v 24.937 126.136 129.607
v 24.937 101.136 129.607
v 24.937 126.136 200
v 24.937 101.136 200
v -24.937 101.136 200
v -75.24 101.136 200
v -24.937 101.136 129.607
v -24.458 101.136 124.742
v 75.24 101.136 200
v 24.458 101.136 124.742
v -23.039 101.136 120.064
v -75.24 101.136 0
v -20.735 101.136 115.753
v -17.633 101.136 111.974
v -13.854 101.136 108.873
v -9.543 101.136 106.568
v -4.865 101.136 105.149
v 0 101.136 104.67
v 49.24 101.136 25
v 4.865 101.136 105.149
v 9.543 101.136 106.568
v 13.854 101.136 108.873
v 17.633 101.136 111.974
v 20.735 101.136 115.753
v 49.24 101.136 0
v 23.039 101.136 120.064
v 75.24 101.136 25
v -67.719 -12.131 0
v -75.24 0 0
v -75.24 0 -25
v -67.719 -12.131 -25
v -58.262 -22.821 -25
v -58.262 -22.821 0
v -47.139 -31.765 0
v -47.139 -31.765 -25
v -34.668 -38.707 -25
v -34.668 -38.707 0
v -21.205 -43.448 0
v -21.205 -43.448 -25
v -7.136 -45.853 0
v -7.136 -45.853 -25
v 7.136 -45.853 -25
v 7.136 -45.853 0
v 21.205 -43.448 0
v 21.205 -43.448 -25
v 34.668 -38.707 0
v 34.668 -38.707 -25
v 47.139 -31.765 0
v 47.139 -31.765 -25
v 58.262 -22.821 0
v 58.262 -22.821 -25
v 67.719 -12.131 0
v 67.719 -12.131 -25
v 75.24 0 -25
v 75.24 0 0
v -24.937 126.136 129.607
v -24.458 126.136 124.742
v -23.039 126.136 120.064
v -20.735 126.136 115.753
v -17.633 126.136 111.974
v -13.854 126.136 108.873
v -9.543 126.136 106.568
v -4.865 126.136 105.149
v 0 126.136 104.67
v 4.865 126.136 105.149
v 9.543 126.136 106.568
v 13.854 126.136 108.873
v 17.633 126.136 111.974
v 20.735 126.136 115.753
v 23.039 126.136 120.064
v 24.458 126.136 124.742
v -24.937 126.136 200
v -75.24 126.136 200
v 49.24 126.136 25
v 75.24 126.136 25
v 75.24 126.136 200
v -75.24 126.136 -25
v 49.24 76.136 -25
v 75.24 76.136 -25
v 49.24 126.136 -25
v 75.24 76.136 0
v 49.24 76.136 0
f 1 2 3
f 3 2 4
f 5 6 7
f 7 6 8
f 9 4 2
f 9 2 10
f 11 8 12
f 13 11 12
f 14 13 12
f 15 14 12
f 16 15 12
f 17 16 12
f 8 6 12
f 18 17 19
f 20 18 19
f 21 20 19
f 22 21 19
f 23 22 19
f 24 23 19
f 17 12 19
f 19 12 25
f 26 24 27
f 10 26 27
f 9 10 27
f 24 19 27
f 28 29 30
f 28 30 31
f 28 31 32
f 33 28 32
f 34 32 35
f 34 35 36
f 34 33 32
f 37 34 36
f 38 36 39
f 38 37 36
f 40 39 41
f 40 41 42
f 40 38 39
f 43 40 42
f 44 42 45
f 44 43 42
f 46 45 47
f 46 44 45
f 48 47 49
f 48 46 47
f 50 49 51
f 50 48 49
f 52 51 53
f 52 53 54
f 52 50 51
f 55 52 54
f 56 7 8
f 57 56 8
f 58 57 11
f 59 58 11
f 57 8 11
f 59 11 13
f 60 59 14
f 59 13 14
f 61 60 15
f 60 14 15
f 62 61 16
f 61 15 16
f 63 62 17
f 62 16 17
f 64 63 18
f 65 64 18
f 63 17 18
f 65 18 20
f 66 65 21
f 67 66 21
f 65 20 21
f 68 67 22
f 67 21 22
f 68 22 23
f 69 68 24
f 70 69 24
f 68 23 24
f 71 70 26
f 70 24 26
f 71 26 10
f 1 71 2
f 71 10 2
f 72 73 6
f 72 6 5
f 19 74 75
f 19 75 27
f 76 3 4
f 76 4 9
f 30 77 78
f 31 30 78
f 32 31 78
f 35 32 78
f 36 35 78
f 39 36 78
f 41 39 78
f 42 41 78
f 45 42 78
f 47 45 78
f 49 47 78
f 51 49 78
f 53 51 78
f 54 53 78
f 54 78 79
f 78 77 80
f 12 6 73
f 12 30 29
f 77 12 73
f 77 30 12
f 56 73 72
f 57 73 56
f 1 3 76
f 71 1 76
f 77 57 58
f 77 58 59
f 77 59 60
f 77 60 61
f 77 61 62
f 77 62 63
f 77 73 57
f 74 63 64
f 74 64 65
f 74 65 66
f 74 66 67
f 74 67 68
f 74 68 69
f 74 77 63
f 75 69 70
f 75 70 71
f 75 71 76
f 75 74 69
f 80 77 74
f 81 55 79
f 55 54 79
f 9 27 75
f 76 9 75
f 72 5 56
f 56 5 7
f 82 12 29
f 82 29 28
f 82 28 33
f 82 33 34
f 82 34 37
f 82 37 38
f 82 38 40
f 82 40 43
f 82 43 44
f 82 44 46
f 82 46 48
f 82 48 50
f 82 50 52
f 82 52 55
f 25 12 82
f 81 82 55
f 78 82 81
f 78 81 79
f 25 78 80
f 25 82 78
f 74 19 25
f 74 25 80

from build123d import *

# Parameters (mm, degrees)
F1_DEPTH = 25
F2_W     = 150.479242
F2_H     = 25
F3_DEPTH = 200
F5_DEPTH = 25.001
F7_DEPTH = 26


with BuildPart() as f1:
    # F0 (on Top) → F1 (new body)
    with BuildSketch(Plane.XY):
        with BuildLine():
            Line((-75.239621, 126.136482), (-75.239621, 0))
            ThreePointArc((-75.239621, 0), (0, -46.155653), (75.239621, 0))
            Line((75.239621, 0), (75.239621, 126.136482))
            Line((75.239621, 126.136482), (-75.239621, 126.136482))
        make_face()
    extrude(amount=-F1_DEPTH)

    # F2 (on face) → F3 (join)
    with BuildSketch(Plane.XY):
        with Locations((0, 113.636482)):
            Rectangle(F2_W, F2_H)
    extrude(amount=F3_DEPTH)

    # F4 (on face) → F5 (cut, through all)
    with BuildSketch(Plane.XZ.offset(-101.136482)):
        with BuildLine():
            Line((-24.937427, 200), (-24.937427, 129.60729))
            ThreePointArc((-24.937427, 129.60729), (0, 104.669863), (24.937427, 129.60729))
            Line((24.937427, 129.60729), (24.937427, 200))
            Line((24.937427, 200), (-24.937427, 200))
        make_face()
    extrude(amount=-F5_DEPTH, mode=Mode.SUBTRACT)

    # F6 (on face) → F7 (cut)
    with BuildSketch(Plane.YZ.offset(75.239621)):
        Polygon((76.136482, -25), (126.136482, -25), (126.136482, 25), (101.136482, 25), (101.136482, 0), (76.136482, 0), align=None)
    extrude(amount=-F7_DEPTH, mode=Mode.SUBTRACT)


solid = f1.part
